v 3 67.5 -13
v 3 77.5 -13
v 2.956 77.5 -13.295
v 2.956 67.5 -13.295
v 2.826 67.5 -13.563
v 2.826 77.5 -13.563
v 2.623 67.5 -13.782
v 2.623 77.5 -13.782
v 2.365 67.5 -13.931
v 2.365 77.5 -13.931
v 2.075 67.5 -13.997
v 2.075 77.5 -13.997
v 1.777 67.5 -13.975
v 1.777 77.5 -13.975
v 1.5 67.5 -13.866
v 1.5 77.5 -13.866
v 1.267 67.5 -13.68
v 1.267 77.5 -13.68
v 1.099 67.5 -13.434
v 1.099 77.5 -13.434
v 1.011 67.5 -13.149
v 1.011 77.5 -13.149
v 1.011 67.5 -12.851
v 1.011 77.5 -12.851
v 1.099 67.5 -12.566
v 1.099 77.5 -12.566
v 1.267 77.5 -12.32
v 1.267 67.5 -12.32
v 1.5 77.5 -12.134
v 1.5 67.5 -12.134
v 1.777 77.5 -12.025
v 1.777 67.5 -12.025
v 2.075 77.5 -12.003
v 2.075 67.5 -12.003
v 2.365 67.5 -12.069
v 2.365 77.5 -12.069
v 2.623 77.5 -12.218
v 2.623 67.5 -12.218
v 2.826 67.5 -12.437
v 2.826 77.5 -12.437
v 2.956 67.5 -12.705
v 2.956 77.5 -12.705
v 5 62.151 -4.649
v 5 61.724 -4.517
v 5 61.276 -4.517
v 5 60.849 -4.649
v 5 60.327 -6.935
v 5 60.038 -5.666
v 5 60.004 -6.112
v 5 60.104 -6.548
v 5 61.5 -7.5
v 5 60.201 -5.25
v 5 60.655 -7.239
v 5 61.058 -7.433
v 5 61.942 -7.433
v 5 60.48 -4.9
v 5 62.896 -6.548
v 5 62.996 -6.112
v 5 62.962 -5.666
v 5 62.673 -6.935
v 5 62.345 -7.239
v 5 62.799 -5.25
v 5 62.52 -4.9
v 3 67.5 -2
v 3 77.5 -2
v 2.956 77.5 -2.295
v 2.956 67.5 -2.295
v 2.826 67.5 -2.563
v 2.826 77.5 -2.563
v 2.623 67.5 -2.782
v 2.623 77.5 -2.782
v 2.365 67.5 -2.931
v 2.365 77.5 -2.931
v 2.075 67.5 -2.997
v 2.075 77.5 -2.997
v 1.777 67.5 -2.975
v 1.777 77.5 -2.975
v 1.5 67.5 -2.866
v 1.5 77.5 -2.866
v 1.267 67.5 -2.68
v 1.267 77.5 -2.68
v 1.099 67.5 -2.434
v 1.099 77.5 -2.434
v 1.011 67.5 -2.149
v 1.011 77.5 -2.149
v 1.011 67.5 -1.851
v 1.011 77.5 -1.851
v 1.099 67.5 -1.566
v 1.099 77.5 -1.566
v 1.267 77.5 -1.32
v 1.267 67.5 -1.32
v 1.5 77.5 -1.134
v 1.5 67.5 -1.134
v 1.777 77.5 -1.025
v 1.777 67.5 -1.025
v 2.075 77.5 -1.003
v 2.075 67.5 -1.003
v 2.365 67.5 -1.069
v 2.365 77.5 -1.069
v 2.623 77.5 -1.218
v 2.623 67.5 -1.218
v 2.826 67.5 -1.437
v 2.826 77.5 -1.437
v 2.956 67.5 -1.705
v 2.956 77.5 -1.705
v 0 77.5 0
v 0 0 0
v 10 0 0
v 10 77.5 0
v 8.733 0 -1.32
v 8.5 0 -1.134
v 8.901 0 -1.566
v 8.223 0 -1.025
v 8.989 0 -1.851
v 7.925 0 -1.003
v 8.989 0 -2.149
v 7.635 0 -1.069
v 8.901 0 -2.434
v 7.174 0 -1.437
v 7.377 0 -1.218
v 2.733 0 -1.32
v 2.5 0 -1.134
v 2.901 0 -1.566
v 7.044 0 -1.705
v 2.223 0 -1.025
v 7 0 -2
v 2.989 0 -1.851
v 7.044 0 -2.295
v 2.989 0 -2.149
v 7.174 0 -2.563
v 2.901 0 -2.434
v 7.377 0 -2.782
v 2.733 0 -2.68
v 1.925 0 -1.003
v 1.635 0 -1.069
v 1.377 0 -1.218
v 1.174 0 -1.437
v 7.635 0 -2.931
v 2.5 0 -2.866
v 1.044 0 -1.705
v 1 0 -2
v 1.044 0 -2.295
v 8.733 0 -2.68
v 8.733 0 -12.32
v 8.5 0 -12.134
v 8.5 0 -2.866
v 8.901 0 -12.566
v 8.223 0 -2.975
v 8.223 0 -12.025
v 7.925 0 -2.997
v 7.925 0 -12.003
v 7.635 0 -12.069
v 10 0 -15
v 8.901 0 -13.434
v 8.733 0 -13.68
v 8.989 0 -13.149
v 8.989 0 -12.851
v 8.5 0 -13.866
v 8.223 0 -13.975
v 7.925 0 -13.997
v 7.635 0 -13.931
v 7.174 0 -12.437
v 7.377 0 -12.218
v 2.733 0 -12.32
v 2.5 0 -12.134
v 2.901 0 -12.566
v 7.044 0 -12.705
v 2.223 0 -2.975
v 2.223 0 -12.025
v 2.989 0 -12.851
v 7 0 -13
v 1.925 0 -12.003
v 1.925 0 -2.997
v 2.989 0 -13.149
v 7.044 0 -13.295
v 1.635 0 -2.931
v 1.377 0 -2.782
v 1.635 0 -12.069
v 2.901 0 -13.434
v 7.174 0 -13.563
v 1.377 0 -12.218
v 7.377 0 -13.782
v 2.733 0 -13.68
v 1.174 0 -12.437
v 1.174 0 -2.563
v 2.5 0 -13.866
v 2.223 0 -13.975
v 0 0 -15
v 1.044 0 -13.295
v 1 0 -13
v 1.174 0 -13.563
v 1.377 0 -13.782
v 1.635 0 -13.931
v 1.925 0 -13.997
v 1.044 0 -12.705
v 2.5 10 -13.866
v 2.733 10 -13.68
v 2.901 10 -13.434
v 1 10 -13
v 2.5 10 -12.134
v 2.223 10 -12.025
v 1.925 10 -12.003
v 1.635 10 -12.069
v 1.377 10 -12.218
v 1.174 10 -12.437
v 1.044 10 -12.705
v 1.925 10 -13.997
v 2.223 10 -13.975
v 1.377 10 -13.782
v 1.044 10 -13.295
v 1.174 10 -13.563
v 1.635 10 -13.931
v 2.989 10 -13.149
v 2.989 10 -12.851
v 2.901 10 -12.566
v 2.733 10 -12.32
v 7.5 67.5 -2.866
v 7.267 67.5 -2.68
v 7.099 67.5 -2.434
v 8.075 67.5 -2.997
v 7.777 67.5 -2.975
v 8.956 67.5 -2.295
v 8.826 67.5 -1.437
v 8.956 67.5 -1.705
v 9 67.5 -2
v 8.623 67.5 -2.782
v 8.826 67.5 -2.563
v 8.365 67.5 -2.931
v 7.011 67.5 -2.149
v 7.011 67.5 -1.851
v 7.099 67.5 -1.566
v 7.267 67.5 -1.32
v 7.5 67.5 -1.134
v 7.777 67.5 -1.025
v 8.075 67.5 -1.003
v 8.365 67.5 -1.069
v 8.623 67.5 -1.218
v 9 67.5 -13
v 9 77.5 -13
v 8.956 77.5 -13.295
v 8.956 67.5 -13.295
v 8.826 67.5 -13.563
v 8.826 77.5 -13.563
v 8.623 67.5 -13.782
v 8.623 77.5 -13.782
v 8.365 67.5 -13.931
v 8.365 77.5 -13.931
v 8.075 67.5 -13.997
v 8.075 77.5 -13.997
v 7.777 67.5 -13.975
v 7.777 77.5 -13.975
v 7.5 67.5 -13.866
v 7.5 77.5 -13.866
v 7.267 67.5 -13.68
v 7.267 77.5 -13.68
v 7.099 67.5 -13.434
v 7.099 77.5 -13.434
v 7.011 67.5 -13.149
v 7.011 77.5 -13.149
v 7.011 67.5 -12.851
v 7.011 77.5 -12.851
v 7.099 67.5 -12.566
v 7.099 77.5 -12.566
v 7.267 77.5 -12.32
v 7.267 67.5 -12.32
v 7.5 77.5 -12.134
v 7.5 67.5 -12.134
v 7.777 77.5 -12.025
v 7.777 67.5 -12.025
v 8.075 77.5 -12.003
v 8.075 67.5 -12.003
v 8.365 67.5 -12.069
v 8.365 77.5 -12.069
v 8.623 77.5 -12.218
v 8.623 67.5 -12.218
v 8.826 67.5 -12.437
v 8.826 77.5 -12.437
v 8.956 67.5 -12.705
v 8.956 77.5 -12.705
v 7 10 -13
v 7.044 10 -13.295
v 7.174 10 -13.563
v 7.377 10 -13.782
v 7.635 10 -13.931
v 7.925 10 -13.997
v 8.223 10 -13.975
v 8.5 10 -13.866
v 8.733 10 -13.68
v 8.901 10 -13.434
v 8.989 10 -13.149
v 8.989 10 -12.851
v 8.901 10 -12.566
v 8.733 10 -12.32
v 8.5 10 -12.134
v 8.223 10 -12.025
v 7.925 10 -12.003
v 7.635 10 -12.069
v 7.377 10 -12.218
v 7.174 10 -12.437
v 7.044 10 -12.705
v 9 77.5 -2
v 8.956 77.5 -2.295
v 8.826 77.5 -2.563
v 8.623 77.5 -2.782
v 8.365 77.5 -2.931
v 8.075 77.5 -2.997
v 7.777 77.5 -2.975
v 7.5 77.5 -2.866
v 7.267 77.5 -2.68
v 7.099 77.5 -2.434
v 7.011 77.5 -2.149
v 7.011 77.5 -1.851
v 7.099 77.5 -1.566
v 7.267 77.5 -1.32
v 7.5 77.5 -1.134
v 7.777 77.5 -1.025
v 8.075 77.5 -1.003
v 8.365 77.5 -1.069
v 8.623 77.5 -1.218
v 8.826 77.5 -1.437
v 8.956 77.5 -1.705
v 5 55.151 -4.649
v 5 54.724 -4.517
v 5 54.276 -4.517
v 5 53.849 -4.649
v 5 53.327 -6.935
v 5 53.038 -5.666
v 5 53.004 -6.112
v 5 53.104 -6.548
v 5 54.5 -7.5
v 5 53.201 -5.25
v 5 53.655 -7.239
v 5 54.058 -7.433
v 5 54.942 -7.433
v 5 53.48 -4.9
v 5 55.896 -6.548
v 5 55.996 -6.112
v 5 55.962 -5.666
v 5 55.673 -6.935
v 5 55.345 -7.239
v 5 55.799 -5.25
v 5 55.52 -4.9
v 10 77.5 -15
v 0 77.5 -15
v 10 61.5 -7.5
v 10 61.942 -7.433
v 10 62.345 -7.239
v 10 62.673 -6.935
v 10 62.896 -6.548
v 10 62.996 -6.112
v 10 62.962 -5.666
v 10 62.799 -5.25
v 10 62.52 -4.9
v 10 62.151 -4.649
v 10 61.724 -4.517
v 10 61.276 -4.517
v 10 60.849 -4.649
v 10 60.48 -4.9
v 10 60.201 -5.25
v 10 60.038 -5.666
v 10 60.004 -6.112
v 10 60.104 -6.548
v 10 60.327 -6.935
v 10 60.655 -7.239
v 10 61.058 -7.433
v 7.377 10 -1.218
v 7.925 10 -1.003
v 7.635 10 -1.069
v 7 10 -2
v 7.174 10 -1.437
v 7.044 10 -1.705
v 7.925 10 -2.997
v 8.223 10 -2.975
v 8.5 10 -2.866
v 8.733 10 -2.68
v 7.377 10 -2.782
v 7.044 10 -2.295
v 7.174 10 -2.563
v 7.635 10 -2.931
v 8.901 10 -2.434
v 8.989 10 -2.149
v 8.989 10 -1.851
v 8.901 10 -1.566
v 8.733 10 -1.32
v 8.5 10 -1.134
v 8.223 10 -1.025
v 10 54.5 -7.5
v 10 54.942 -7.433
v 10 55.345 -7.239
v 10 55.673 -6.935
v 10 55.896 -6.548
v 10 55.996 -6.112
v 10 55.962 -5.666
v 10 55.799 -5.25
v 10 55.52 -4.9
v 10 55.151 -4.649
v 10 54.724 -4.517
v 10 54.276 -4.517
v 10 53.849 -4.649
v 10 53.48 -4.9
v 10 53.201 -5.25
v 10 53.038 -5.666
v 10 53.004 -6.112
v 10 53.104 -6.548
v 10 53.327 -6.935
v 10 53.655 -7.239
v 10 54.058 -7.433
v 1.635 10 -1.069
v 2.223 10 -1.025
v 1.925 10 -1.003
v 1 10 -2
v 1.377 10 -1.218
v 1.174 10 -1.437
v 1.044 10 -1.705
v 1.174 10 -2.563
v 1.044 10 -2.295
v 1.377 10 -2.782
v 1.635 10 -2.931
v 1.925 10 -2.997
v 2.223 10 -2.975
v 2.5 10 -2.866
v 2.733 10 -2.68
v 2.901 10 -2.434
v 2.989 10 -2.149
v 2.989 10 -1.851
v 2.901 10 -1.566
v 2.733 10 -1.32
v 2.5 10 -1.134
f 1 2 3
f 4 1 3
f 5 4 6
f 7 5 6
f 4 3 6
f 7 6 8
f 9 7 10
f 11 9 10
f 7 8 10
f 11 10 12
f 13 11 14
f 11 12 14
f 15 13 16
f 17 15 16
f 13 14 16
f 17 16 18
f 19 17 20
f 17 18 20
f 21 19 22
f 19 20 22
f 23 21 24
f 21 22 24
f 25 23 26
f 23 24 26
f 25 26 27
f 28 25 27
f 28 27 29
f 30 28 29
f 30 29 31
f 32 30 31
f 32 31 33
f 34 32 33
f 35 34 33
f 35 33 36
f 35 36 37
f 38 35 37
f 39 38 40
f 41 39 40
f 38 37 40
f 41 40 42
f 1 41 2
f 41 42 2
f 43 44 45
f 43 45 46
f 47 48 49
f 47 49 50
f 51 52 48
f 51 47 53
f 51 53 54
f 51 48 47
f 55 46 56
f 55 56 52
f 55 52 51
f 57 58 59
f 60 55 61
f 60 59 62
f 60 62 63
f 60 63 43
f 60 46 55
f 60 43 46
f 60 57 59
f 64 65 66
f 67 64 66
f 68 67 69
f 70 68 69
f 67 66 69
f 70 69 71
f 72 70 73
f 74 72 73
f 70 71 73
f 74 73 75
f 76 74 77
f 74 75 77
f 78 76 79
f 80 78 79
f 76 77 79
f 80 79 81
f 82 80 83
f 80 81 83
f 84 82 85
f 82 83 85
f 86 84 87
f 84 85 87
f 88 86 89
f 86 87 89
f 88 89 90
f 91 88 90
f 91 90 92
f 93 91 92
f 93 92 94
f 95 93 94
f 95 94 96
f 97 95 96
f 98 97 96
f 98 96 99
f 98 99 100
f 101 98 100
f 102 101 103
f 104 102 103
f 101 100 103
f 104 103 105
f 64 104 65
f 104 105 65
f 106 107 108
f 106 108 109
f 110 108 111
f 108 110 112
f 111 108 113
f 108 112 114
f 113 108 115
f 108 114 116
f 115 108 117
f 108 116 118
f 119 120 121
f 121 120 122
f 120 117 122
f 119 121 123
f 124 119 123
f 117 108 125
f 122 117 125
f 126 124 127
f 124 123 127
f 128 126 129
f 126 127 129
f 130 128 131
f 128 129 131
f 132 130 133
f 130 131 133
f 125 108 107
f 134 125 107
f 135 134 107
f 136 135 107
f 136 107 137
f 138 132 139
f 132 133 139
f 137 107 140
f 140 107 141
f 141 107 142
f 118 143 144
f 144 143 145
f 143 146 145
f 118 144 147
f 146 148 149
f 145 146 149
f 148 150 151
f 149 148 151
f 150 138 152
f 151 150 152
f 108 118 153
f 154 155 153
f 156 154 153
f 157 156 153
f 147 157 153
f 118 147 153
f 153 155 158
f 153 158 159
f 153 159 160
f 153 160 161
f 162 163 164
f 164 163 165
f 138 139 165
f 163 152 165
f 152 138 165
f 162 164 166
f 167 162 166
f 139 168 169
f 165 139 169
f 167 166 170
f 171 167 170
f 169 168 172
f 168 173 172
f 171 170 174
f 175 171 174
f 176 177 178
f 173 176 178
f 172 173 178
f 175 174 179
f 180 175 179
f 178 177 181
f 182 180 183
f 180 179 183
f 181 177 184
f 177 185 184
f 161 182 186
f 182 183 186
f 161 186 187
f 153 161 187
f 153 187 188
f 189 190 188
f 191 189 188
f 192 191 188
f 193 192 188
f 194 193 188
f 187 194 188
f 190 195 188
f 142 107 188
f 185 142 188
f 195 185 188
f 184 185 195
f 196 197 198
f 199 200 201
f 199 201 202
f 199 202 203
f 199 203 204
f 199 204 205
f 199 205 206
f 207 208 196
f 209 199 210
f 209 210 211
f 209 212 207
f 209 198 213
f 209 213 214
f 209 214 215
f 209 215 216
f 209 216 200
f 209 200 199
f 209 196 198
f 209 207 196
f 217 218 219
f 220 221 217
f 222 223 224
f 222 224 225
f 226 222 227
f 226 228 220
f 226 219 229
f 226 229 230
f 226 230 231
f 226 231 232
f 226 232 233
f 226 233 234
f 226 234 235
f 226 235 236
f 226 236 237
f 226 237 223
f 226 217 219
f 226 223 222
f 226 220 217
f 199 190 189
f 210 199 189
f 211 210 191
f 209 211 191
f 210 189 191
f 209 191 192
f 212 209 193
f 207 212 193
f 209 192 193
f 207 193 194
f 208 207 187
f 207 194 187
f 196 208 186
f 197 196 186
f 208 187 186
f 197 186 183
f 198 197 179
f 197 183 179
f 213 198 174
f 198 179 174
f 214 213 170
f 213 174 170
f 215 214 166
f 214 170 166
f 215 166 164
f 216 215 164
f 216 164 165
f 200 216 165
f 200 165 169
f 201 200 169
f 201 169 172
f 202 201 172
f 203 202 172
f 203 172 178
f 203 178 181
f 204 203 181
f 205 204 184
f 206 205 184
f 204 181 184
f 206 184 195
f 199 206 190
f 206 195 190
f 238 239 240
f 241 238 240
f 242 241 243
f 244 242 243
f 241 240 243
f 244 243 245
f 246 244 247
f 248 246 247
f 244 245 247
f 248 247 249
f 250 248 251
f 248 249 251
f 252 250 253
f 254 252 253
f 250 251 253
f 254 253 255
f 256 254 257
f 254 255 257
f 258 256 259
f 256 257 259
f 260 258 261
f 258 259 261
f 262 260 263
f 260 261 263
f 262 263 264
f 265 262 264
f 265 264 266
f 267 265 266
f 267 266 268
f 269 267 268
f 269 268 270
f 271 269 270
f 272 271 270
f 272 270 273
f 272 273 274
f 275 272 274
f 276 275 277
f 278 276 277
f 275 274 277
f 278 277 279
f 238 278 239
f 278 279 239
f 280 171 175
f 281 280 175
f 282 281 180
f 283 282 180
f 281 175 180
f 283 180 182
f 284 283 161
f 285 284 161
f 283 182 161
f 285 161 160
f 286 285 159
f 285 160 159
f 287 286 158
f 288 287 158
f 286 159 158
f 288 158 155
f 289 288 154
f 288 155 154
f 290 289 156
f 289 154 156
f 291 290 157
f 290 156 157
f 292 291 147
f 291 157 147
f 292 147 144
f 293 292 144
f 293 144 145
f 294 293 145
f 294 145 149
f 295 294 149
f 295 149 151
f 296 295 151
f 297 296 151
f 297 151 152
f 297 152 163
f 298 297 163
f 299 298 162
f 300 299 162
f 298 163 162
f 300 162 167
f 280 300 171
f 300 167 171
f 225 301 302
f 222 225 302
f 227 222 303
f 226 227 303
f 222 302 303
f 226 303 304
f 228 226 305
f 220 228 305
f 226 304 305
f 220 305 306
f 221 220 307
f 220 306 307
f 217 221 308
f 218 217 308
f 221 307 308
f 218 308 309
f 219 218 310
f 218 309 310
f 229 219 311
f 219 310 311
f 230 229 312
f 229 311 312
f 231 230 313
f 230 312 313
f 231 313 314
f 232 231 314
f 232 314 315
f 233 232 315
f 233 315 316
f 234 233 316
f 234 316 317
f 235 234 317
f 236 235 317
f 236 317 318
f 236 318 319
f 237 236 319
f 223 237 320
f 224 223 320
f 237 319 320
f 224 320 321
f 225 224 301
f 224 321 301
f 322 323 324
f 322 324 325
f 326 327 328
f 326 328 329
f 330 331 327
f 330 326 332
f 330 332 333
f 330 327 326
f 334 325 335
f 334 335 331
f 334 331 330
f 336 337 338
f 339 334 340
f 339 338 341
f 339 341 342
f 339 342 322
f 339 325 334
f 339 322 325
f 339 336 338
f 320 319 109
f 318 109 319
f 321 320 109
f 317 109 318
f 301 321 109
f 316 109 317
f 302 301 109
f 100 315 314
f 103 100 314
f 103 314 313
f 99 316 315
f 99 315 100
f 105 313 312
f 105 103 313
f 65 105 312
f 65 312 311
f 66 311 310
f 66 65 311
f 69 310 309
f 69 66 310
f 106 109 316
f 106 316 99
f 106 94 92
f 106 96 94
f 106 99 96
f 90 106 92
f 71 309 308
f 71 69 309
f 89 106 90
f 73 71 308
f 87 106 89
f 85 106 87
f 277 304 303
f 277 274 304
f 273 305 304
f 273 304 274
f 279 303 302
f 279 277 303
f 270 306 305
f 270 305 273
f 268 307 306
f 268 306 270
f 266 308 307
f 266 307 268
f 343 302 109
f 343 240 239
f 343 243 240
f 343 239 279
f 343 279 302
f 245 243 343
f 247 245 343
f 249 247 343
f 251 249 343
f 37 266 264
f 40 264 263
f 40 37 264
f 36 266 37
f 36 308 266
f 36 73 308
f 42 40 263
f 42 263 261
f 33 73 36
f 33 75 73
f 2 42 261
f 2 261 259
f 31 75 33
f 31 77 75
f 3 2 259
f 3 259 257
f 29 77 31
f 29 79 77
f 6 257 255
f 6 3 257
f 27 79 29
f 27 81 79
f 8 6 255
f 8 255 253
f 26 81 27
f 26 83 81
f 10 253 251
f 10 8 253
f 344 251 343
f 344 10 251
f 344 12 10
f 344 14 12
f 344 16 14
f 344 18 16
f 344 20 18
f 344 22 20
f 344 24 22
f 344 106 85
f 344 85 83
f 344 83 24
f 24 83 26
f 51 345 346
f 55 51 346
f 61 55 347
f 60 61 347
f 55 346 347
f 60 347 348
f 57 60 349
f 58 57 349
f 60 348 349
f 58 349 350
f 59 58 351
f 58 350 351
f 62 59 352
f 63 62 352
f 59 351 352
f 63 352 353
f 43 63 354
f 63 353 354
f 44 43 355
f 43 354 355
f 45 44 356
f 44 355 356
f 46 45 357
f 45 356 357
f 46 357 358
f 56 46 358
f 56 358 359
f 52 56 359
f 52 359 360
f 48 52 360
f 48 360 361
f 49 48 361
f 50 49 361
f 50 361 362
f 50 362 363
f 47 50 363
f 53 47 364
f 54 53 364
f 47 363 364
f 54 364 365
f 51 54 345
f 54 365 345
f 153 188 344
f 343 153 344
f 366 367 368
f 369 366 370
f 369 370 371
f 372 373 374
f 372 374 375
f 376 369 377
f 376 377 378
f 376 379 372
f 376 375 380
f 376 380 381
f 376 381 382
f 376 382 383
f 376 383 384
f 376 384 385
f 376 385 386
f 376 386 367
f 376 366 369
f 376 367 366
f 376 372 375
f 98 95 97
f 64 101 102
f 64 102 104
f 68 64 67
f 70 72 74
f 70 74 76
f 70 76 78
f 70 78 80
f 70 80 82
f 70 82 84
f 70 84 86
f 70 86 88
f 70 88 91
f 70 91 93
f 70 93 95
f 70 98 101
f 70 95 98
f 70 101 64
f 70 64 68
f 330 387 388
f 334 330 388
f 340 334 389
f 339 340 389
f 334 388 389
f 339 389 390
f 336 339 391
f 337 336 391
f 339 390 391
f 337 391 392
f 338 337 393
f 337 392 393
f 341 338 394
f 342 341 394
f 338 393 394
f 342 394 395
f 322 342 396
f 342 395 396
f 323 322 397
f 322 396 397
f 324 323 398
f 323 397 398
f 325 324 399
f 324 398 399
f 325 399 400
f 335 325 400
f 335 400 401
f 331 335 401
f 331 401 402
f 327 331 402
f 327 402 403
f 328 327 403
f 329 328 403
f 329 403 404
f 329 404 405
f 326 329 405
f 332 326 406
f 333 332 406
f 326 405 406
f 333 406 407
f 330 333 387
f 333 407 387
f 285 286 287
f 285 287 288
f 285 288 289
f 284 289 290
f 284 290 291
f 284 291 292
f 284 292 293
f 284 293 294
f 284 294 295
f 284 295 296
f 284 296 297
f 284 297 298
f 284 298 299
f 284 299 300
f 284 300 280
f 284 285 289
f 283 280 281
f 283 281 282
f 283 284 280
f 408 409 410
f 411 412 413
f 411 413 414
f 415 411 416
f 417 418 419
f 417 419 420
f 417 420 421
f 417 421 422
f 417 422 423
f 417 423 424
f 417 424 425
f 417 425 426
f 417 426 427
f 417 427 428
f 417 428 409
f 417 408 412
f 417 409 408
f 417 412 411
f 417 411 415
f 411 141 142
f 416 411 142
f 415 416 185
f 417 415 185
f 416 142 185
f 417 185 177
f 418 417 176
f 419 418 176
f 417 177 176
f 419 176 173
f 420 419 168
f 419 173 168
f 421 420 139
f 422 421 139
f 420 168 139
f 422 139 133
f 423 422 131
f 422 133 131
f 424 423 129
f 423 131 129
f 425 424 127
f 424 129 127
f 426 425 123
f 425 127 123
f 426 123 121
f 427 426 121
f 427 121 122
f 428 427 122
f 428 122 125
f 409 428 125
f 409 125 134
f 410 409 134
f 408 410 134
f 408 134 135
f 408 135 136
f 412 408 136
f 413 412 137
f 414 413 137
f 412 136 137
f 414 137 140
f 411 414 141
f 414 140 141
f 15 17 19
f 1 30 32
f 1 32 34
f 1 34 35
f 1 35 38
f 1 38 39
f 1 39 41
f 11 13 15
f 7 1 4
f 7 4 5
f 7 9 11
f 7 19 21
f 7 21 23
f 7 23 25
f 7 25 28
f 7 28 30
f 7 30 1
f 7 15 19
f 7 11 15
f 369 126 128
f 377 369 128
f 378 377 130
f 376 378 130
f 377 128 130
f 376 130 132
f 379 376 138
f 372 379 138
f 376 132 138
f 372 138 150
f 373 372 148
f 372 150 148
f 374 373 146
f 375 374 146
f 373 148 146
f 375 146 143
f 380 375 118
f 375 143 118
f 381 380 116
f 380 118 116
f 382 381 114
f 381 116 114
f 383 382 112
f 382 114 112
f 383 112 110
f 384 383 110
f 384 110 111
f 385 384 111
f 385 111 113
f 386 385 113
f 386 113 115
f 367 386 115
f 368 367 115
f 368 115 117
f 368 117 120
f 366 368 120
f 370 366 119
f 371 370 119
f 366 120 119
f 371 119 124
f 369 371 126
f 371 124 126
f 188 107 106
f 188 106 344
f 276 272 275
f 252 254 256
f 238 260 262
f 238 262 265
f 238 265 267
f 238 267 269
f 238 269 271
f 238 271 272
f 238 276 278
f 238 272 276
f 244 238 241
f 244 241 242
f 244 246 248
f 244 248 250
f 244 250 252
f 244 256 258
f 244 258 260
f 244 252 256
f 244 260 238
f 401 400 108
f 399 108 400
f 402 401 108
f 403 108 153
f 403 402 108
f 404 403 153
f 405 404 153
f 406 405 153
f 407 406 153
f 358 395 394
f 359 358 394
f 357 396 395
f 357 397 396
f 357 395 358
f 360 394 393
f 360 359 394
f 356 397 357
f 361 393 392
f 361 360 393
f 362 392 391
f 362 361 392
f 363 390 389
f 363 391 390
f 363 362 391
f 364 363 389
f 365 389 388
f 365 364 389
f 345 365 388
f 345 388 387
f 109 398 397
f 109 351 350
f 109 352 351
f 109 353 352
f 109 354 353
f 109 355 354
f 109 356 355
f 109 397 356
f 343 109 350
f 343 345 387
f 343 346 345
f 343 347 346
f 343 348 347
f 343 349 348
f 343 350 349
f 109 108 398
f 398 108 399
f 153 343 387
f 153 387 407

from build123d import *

# Parameters (mm, degrees)
SKETCH1_W           = 15
SKETCH1_H           = 77.5
BOSS_EXTRUDE1_DEPTH = 10
SKETCH3_R           = 1
CUT_EXTRUDE1_DEPTH  = 10
SKETCH4_R           = 1
CUT_EXTRUDE2_DEPTH  = 10
SKETCH5_R           = 1.5
CUT_EXTRUDE3_DEPTH  = 5


with BuildPart() as part:
    # Sketch1 → Boss-Extrude1 (new body)
    with BuildSketch(Plane(origin=(0, 0, 0), x_dir=(0, 0, -1), z_dir=(1, 0, 0))):
        with Locations((7.5, 38.75)):
            Rectangle(SKETCH1_W, SKETCH1_H)
    extrude(amount=BOSS_EXTRUDE1_DEPTH)

    # Sketch3 → Cut-Extrude1 (cut)
    with BuildSketch(Plane(origin=(0, 77.5, 0), x_dir=(1, 0, 0), z_dir=(0, 1, 0))):
        with Locations((2, 13)):
            Circle(SKETCH3_R)
        with Locations((8, 13)):
            Circle(SKETCH3_R)
        with Locations((8, 2)):
            Circle(SKETCH3_R)
        with Locations((2, 2)):
            Circle(SKETCH3_R)
    extrude(amount=-CUT_EXTRUDE1_DEPTH, mode=Mode.SUBTRACT)

    # Sketch4 → Cut-Extrude2 (cut)
    with BuildSketch(Plane(origin=(0, 0, 0), x_dir=(-1, 0, 0), z_dir=(0, -1, 0))):
        with Locations((-8, 2)):
            Circle(SKETCH4_R)
        with Locations((-8, 13)):
            Circle(SKETCH4_R)
        with Locations((-2, 13)):
            Circle(SKETCH4_R)
        with Locations((-2, 2)):
            Circle(SKETCH4_R)
    extrude(amount=-CUT_EXTRUDE2_DEPTH, mode=Mode.SUBTRACT)

    # Sketch5 → Cut-Extrude3 (cut)
    with BuildSketch(Plane(origin=(10, 0, 0), x_dir=(0, 0, -1), z_dir=(1, 0, 0))):
        with Locations((6, 61.5)):
            Circle(SKETCH5_R)
        with Locations((6, 54.5)):
            Circle(SKETCH5_R)
    extrude(amount=-CUT_EXTRUDE3_DEPTH, mode=Mode.SUBTRACT)


solid = part.part
